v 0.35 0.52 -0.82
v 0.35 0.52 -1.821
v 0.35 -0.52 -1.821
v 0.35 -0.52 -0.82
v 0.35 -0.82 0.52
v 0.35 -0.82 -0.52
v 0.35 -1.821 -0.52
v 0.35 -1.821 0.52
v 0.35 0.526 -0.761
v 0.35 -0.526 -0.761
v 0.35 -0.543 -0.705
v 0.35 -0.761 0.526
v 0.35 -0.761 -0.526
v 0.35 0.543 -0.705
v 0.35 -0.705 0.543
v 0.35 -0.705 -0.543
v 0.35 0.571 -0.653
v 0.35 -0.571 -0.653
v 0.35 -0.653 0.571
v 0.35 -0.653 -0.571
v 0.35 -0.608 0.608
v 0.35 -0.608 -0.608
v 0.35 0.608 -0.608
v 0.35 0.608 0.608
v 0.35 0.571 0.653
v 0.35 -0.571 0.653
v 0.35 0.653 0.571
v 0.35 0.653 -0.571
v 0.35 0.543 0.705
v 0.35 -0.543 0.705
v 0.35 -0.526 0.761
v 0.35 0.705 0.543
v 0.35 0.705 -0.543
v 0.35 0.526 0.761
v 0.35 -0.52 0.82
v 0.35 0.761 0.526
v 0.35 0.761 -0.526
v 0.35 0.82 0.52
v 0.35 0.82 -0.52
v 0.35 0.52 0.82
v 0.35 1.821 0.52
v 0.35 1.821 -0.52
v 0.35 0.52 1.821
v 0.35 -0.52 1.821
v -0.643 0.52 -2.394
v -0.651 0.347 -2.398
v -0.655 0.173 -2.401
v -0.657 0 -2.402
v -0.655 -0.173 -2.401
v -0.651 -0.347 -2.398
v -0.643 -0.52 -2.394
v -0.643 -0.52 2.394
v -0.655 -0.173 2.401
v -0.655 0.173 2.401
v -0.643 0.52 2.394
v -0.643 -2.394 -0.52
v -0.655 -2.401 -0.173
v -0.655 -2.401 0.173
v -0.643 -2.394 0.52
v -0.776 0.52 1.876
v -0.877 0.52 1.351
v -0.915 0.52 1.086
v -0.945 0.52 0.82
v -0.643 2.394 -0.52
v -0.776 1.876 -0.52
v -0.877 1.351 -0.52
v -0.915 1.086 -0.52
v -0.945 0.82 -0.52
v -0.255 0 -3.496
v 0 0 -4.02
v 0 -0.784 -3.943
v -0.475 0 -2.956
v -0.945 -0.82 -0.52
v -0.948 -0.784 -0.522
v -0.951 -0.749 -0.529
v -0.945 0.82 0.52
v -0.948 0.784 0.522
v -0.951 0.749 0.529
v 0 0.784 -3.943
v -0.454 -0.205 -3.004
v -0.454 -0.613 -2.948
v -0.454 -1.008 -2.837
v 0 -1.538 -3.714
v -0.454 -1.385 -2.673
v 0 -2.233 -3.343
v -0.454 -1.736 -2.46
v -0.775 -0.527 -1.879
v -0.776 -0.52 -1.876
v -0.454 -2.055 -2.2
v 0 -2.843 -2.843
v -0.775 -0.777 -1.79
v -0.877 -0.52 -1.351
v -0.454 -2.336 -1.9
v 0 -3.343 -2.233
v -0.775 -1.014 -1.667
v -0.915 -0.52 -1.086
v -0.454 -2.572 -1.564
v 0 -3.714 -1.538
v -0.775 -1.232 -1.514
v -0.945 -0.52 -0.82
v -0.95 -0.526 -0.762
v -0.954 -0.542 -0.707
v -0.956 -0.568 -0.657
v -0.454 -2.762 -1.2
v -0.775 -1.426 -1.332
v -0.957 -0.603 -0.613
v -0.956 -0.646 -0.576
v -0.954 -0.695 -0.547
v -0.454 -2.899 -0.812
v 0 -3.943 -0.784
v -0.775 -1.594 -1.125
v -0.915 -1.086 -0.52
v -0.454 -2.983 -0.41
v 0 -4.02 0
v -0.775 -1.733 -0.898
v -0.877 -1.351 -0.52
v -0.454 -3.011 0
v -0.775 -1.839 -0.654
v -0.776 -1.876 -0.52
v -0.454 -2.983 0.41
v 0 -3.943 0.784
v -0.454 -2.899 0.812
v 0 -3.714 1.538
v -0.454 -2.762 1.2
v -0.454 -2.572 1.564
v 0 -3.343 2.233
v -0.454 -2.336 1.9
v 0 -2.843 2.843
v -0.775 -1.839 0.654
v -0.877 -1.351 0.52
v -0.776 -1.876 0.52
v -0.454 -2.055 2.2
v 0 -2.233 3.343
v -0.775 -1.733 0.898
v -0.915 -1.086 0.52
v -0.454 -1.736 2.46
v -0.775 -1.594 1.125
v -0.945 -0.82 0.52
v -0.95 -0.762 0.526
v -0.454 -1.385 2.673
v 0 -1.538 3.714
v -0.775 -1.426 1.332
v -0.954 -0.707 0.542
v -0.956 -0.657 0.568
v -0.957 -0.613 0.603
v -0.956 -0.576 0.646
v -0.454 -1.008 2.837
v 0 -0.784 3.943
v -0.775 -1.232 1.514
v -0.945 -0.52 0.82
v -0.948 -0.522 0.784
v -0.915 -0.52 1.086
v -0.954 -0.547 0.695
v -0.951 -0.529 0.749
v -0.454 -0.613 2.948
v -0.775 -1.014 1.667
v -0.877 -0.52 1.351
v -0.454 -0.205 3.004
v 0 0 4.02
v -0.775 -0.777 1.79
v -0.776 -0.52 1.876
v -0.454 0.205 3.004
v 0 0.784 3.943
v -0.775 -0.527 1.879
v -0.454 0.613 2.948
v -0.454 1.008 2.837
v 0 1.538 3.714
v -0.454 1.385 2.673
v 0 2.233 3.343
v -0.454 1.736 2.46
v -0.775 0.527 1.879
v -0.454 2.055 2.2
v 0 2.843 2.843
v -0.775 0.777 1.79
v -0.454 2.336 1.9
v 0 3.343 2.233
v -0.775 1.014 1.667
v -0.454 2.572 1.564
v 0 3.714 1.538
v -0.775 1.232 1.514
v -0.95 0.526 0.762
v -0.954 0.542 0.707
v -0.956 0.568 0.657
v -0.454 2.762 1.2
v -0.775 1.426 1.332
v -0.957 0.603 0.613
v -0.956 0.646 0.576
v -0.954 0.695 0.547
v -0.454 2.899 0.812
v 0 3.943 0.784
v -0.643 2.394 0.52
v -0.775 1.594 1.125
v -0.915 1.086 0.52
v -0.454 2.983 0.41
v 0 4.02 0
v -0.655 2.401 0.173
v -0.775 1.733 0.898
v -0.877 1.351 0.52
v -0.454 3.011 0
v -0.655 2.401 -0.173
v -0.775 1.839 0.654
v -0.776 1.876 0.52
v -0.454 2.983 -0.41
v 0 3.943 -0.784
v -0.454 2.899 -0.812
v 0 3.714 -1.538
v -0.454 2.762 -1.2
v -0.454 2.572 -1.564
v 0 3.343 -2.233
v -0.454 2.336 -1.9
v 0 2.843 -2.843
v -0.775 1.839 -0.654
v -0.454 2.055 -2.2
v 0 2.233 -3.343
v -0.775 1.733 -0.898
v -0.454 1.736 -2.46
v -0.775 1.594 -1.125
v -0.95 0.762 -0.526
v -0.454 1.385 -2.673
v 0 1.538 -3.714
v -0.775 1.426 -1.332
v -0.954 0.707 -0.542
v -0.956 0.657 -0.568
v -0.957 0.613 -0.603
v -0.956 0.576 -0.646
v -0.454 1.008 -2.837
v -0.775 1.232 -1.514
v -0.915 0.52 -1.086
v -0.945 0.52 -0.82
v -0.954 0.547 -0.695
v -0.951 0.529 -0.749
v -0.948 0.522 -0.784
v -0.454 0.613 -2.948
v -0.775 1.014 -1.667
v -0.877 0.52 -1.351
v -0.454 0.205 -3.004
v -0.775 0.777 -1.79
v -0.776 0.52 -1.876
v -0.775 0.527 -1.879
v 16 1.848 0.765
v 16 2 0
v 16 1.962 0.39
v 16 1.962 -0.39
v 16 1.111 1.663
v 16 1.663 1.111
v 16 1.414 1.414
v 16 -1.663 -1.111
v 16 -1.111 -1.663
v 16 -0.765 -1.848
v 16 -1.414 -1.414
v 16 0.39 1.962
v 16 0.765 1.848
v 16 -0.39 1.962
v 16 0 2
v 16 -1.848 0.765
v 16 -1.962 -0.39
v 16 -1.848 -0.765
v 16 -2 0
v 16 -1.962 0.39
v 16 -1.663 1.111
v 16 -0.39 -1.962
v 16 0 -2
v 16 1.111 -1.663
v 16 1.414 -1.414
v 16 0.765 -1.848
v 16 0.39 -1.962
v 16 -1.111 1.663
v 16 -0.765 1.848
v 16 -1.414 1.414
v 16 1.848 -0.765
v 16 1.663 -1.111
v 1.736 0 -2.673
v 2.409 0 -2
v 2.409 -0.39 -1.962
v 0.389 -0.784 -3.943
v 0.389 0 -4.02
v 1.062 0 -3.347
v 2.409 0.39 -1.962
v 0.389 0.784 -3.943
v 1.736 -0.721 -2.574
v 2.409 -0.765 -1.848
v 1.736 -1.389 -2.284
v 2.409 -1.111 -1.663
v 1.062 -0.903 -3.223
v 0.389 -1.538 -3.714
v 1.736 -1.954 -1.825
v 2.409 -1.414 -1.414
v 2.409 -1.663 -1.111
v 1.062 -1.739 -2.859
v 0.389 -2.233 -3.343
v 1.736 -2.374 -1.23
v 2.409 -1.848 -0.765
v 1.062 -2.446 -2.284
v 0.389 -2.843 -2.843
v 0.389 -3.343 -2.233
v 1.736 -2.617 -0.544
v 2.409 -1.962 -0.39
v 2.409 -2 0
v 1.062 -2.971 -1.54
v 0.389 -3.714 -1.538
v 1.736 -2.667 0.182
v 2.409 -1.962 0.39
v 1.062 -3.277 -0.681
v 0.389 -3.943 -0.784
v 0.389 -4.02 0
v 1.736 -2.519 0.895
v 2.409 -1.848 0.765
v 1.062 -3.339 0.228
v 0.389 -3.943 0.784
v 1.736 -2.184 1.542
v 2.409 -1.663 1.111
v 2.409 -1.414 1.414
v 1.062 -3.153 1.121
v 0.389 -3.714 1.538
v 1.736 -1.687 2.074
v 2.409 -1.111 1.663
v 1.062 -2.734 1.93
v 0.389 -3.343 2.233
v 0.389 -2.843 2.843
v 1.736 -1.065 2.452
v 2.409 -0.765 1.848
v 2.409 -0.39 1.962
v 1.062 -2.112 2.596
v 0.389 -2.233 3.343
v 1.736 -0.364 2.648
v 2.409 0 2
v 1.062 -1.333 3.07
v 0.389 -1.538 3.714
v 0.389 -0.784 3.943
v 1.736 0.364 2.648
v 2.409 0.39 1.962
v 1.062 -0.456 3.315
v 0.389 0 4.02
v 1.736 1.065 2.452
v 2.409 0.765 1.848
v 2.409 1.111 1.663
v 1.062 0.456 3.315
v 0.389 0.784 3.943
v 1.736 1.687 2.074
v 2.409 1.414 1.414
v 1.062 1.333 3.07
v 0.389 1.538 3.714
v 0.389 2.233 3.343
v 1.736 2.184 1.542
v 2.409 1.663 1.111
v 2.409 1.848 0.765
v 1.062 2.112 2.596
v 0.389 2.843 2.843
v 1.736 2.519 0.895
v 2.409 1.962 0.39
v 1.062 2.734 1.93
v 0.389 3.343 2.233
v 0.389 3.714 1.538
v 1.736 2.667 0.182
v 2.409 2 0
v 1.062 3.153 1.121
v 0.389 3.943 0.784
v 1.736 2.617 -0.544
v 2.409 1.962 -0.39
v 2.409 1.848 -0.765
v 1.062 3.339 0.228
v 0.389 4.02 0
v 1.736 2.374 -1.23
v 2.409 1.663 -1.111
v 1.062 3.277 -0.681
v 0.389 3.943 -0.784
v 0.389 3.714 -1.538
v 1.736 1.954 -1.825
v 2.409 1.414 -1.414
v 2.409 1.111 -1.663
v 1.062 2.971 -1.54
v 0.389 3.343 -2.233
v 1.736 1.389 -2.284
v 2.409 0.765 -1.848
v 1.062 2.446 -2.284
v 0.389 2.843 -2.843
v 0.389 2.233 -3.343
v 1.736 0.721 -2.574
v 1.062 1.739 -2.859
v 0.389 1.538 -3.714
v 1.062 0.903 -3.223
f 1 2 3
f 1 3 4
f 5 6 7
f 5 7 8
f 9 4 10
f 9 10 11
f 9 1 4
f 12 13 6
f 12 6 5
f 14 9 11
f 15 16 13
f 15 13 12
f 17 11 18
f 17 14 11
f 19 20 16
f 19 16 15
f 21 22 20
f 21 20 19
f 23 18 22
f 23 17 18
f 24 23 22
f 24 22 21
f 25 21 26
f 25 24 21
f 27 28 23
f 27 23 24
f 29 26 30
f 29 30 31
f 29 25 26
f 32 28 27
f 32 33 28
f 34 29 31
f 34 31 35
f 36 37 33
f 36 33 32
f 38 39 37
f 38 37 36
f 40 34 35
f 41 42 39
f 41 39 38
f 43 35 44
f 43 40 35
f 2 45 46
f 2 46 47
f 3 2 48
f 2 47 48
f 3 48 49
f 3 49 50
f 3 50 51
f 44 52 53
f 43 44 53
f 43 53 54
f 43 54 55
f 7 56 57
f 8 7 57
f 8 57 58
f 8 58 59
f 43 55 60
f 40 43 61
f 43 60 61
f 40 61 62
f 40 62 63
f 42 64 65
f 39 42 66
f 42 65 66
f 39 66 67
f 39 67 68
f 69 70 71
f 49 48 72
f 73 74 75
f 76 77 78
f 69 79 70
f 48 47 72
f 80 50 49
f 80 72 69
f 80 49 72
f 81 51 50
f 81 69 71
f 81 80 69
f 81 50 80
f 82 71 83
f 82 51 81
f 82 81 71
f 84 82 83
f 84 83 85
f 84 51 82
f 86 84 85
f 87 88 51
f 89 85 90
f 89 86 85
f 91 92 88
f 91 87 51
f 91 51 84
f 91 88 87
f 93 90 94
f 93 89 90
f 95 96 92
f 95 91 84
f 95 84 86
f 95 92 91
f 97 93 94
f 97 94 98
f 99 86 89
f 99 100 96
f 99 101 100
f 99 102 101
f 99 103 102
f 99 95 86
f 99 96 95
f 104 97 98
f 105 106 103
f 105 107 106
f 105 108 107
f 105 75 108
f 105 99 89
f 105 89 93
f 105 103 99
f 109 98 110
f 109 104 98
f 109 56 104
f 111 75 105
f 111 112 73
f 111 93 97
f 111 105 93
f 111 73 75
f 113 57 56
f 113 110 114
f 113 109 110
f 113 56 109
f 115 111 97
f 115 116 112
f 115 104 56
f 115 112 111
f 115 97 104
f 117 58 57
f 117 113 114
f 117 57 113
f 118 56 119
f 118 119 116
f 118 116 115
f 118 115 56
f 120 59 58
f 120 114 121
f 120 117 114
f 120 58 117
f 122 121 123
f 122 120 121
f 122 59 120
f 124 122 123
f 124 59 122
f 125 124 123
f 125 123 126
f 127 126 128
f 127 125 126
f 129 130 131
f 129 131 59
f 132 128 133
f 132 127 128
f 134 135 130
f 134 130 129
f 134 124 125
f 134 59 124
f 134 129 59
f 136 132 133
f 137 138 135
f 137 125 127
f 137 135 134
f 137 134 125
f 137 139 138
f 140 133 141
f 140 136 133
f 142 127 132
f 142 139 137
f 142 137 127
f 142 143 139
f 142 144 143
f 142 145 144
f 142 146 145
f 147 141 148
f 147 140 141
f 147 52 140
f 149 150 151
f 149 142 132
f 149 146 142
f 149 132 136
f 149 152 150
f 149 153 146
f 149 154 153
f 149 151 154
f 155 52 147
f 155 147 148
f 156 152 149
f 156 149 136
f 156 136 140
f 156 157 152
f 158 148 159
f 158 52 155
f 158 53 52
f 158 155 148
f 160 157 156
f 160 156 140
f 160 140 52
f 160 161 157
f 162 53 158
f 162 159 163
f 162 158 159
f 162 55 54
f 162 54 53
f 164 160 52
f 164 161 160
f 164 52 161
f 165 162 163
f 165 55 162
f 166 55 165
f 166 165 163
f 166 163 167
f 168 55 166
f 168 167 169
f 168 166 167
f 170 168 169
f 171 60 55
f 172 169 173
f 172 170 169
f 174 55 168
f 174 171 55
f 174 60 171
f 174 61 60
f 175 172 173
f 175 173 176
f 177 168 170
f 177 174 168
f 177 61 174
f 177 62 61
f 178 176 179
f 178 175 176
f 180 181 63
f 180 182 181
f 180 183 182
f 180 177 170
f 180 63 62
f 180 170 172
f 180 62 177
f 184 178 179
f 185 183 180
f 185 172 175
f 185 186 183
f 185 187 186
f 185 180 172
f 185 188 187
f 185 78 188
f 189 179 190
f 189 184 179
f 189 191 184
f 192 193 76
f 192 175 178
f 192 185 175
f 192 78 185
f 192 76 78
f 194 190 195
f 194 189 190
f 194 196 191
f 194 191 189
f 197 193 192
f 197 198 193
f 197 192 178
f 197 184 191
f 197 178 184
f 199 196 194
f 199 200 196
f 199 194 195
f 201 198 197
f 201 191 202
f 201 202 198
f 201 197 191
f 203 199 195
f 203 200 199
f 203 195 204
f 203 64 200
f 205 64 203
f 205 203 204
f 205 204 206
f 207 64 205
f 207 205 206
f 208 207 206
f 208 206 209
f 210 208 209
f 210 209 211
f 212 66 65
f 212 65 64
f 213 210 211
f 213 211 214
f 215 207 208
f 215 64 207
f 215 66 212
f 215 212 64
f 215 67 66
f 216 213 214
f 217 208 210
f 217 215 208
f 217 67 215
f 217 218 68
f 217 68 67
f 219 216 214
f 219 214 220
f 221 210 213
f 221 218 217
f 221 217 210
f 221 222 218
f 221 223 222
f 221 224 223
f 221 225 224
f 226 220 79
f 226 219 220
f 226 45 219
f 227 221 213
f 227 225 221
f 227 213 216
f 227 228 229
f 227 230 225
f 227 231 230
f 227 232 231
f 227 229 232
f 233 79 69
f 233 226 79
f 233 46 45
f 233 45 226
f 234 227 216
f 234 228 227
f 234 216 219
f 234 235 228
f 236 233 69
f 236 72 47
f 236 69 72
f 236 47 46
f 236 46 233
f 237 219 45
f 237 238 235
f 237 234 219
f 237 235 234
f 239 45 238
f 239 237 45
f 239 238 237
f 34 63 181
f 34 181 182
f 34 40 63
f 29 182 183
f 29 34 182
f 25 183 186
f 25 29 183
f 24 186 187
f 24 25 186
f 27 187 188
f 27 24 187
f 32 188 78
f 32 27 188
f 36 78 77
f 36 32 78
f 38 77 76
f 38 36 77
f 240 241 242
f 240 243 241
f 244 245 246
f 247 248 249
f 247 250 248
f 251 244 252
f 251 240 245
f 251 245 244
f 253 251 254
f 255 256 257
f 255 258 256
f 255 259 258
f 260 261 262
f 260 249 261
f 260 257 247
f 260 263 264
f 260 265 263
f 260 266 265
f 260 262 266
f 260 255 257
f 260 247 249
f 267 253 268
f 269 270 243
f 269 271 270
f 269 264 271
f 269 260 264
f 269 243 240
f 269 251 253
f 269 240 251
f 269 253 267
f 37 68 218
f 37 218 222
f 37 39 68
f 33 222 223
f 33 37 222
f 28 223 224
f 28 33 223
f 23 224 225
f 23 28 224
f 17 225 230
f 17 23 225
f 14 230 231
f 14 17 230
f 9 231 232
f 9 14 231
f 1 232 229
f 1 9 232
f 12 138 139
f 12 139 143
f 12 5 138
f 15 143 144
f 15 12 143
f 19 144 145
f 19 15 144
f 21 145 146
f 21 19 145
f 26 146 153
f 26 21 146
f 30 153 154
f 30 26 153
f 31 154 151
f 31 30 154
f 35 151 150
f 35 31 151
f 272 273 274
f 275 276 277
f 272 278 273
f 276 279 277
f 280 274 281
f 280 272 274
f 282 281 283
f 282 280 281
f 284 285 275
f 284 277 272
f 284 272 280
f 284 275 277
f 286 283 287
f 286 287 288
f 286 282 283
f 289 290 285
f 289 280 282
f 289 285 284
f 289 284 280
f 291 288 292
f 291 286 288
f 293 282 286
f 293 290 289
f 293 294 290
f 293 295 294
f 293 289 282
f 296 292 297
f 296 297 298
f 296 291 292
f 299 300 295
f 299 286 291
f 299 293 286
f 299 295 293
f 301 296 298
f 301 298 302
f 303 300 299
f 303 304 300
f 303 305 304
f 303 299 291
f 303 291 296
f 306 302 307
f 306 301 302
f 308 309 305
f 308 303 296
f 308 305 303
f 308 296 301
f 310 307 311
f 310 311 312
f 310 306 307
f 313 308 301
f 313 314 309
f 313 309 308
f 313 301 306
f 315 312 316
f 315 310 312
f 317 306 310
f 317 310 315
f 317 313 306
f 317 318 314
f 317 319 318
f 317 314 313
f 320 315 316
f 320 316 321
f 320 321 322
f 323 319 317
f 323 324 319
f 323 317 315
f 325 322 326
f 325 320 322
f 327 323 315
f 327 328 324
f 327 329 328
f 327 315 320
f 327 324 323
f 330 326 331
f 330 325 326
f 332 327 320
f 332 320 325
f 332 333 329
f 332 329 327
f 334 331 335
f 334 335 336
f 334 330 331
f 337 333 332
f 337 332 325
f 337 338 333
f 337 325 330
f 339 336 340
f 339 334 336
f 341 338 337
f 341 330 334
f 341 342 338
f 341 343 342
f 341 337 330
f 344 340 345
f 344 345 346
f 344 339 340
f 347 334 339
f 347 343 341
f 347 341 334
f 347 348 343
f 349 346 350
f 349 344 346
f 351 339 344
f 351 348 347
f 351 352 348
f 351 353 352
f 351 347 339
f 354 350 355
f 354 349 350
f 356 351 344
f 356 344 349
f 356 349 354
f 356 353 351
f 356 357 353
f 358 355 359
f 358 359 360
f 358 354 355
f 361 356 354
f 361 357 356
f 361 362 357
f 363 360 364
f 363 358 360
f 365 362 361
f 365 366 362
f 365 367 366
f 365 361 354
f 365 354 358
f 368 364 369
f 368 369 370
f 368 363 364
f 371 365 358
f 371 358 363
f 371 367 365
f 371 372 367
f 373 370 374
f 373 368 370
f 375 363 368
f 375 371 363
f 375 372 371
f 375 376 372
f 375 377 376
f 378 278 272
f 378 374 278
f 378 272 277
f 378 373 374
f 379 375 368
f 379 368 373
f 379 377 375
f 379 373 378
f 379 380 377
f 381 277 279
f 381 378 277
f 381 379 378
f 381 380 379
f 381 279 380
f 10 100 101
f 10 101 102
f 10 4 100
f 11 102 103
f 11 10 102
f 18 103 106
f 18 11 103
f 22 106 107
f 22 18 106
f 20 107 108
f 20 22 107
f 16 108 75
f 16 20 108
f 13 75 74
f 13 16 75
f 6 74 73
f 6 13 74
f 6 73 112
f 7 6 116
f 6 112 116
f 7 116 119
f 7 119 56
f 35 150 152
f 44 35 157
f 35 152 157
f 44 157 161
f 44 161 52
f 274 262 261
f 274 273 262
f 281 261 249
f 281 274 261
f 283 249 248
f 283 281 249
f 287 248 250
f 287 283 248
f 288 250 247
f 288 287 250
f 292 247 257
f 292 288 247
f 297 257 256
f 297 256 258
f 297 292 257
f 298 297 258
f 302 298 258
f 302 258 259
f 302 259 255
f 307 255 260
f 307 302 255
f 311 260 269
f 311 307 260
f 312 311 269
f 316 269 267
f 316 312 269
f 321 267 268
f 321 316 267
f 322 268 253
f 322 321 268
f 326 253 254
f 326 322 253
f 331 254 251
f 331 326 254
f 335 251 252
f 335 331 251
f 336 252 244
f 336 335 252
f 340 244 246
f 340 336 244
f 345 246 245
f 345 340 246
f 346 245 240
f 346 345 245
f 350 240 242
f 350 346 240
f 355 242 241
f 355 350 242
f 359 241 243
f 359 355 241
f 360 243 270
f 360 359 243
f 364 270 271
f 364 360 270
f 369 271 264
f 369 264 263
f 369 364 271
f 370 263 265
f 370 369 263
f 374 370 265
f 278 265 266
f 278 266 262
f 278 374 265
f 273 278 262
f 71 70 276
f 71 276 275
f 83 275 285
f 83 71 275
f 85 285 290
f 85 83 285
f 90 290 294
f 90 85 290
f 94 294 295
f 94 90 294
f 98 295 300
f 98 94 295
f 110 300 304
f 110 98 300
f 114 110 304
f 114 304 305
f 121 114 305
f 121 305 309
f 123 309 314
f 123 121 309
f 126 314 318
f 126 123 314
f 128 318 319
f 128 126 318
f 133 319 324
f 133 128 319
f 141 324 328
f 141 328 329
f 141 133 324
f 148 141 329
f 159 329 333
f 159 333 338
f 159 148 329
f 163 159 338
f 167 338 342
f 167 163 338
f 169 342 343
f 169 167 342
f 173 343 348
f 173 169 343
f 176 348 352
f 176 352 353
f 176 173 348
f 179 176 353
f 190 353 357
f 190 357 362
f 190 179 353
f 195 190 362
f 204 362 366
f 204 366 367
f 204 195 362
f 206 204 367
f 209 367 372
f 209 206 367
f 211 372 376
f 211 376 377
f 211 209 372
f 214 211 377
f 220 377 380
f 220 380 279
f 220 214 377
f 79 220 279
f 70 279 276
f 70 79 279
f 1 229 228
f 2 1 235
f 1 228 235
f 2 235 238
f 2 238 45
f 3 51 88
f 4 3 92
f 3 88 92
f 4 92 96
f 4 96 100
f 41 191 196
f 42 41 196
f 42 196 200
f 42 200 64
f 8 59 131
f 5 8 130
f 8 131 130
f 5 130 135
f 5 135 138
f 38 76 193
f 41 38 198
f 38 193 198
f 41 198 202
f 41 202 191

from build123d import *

# Parameters (mm, degrees)
BASETOP_FACE_RADIUS = 4.02
BASETOP_HEIGHT      = 1
CROSSRECESS_DEPTH   = 1.35
DRAFT9_ANGLE        = -30
FILLET5_R           = 0.3


with BuildPart() as part:
    # Sketch1 → Base (revolve)
    with BuildSketch(Plane.XY, mode=Mode.PRIVATE) as base_sk:
        Polygon((16, 2), (4.187867966, 2), (2.408867966, 2), (0.388867966, 4.02), (0, 4.02), (0, 0), (16, 0), align=None)
    revolve(base_sk.sketch.rotate(Axis((4.515812911, 0, 0), (-1, 0, 0)), 90), axis=Axis((4.515812911, 0, 0), (-1, 0, 0)))

    # BaseTop: a dome of height H over a round flat face of radius A is a cap of a sphere of radius (A * A + H * H) / (2 * H)
    basetop_r = (BASETOP_FACE_RADIUS * BASETOP_FACE_RADIUS + BASETOP_HEIGHT * BASETOP_HEIGHT) / (2 * BASETOP_HEIGHT)
    basetop_base = Plane((0, 0, 0), z_dir=(-1, 0, 0))
    with Locations(basetop_base.offset(BASETOP_HEIGHT - basetop_r)):
        basetop_ball = Sphere(basetop_r, mode=Mode.PRIVATE)
    add(split(basetop_ball, bisect_by=basetop_base, keep=Keep.TOP, mode=Mode.PRIVATE))

    # Sketch6 → CrossRecess (cut)
    with BuildSketch(Plane.ZY.offset(1)):
        Polygon((0.52, 0.52), (0.52, 2.6), (-0.52, 2.6), (-0.52, 0.52), (-2.6, 0.52), (-2.6, -0.52), (-0.52, -0.52), (-0.52, -2.6), (0.52, -2.6), (0.52, -0.52), (2.6, -0.52), (2.6, 0.52), align=None)
    extrude(amount=-CROSSRECESS_DEPTH, mode=Mode.SUBTRACT)

    # Draft9
    draft9_faces = [part.faces().sort_by_distance(p)[0] for p in [
        (-0.120548575, 0, -2.6),
        (-0.120548575, -2.6, 0),
        (-0.120548575, 0, 2.6),
        (-0.120548575, 2.6, 0),
    ]]
    draft(draft9_faces, Plane(origin=(-1, 0, 0), x_dir=(0, 0, 1), z_dir=(1, 0, 0)), DRAFT9_ANGLE)

    # Fillet5
    fillet5_edges = [part.edges().sort_by_distance(p)[0] for p in [
        (-0.309213747, 0.52, -0.52),
        (-0.309213747, 0.52, 0.52),
        (-0.309213747, -0.52, 0.52),
        (-0.309213747, -0.52, -0.52),
    ]]
    fillet(fillet5_edges, radius=FILLET5_R)


solid = part.part
